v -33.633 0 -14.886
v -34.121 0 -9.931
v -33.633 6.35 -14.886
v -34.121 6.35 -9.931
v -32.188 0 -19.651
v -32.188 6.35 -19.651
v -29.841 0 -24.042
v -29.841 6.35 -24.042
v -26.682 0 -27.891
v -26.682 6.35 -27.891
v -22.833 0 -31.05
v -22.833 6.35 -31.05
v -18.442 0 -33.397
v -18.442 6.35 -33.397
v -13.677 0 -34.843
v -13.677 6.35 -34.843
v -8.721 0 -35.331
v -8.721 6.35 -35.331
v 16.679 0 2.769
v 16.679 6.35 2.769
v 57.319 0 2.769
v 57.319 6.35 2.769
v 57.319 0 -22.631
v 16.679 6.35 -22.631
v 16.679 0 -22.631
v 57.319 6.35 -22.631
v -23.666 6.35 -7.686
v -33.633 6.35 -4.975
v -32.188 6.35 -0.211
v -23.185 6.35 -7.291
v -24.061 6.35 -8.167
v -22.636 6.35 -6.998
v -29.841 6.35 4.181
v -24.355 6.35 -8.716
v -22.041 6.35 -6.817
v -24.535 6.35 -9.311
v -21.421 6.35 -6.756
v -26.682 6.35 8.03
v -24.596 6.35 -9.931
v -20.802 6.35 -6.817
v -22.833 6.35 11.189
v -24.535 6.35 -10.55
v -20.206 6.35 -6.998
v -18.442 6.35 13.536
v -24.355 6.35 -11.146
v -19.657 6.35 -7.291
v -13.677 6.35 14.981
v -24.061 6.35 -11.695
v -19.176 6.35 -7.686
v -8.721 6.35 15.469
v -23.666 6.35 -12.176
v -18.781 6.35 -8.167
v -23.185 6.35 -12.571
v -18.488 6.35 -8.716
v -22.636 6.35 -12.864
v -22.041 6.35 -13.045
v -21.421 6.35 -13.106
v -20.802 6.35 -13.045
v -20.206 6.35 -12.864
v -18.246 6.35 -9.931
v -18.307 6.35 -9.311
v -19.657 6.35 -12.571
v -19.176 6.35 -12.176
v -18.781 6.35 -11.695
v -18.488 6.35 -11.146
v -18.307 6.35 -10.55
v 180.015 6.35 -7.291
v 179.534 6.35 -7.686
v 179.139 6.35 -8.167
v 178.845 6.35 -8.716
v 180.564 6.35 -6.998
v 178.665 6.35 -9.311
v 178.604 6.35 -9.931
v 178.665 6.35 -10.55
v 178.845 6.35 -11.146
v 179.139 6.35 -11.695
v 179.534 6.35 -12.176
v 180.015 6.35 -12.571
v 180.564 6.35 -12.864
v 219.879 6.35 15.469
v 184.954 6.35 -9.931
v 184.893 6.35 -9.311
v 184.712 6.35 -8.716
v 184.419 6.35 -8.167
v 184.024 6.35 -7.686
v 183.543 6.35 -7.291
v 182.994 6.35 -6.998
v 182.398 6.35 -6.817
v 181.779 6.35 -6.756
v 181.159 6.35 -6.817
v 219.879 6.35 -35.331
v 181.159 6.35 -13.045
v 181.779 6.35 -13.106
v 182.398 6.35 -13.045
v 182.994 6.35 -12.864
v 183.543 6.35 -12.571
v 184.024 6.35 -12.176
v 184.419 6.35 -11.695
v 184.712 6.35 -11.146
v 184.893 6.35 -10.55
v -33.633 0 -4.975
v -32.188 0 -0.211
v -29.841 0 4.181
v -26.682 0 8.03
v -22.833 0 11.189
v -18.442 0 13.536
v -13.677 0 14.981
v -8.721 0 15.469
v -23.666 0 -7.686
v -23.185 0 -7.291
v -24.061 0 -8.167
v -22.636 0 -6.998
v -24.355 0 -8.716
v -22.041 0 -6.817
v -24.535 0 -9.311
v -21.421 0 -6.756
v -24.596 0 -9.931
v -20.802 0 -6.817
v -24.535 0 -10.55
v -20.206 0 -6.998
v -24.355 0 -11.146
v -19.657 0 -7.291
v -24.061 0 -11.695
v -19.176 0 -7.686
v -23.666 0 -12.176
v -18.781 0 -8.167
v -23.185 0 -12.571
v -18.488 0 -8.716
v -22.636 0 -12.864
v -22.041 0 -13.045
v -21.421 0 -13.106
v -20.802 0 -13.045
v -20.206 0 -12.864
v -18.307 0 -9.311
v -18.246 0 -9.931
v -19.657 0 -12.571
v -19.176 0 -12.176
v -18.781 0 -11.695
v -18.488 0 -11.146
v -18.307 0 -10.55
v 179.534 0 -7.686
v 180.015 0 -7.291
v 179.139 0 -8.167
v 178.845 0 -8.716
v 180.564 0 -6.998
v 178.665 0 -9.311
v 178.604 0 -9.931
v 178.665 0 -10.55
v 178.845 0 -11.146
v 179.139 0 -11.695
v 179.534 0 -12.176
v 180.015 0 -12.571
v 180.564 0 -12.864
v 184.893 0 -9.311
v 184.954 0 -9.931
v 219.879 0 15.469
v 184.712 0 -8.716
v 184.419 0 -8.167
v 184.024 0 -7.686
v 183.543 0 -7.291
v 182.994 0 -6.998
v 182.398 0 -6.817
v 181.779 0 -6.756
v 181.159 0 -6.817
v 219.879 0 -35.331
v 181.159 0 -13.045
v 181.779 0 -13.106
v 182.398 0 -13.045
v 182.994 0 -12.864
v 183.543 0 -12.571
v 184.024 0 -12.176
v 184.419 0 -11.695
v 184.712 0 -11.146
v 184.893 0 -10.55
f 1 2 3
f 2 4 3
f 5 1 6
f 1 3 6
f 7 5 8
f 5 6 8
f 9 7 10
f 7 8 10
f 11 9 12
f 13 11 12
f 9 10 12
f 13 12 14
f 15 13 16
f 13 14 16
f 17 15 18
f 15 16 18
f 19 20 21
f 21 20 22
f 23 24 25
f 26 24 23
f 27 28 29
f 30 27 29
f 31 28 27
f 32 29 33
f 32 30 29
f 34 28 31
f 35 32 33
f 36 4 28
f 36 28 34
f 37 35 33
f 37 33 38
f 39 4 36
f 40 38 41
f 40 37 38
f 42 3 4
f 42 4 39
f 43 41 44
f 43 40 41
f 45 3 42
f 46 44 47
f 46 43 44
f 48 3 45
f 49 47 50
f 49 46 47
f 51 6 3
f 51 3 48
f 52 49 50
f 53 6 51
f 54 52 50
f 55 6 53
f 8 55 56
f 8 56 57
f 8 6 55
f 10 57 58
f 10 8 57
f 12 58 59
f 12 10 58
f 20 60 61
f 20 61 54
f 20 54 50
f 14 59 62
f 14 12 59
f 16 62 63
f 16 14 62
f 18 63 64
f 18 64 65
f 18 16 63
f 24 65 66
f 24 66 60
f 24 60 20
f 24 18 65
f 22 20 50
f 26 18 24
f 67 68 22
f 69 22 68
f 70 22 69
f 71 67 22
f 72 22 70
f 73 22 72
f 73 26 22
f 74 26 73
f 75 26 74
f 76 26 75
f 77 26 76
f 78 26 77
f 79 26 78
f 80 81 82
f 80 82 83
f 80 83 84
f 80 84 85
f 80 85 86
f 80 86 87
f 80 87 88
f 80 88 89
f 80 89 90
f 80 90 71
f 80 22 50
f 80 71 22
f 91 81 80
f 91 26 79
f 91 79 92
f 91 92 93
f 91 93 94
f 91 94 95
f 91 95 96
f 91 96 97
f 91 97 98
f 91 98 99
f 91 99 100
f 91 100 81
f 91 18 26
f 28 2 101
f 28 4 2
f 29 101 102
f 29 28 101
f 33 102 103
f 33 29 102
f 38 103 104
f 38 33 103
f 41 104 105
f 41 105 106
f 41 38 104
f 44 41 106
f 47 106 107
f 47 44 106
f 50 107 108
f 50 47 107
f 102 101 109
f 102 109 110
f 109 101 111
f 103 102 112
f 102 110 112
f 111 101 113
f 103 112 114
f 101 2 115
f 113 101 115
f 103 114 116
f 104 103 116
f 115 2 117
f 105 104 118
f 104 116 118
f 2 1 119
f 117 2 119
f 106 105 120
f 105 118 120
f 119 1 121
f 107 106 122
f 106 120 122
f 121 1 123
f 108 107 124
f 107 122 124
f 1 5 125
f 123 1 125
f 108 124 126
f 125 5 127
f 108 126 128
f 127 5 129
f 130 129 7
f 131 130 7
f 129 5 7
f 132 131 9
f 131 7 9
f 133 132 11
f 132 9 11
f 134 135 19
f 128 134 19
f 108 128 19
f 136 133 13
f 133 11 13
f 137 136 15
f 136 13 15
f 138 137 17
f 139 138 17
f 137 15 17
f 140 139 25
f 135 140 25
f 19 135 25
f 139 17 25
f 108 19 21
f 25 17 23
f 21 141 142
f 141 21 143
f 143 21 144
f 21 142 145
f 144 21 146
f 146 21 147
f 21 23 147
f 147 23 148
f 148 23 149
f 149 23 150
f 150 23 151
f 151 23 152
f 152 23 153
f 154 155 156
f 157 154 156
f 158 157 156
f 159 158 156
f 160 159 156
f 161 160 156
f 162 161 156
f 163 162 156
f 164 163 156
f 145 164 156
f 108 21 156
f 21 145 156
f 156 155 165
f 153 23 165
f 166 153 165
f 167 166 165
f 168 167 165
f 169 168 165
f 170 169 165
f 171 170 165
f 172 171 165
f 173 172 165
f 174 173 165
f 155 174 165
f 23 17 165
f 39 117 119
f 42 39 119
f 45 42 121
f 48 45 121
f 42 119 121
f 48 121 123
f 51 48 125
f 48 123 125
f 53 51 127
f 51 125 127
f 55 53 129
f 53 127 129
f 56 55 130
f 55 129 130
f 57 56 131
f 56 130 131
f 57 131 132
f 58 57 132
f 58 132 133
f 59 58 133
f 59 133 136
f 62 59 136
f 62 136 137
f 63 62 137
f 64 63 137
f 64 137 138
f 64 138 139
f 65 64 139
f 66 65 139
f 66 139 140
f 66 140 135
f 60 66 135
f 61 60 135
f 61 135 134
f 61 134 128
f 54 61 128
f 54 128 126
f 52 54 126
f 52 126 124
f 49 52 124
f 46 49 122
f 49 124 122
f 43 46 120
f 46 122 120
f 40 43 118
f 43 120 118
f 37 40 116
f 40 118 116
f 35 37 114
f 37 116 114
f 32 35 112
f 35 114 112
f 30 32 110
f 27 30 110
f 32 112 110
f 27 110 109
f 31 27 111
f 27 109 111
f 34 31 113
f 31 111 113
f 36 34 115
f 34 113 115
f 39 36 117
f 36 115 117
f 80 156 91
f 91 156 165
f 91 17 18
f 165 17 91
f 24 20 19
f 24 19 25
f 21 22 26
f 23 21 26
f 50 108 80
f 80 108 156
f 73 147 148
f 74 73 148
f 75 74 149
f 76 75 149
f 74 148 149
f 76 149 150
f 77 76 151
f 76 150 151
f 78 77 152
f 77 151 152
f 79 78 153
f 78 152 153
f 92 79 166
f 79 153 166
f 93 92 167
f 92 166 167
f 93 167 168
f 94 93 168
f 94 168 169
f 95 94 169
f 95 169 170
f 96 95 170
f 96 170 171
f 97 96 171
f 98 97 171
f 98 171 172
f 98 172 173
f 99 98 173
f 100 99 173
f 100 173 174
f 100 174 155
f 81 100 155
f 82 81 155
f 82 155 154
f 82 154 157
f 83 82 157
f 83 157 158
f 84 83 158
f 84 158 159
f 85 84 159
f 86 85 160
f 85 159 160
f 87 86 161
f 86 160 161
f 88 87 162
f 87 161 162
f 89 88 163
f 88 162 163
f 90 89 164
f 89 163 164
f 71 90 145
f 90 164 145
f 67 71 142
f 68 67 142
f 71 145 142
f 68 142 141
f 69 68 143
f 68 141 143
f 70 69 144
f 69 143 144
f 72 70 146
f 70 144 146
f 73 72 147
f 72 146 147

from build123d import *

# Parameters (mm, degrees)
SKETCH1_W                   = 254
SKETCH1_H                   = 50.8
BOSS_EXTRUDE1_DEPTH         = 6.35
F_1_4_0_25_DIAMETER_HOLE1_D = 6.35
FILLET1_R                   = 25.4
SKETCH4_W                   = 40.64
SKETCH4_H                   = 25.4
CUT_EXTRUDE1_DEPTH          = 25.4


with BuildPart() as part:
    # Sketch1 → Boss-Extrude1 (new body)
    with BuildSketch(Plane(origin=(0, 0, 0), x_dir=(1, 0, 0), z_dir=(0, 1, 0))):
        with Locations((92.878696742, 9.930827068)):
            Rectangle(SKETCH1_W, SKETCH1_H)
    extrude(amount=BOSS_EXTRUDE1_DEPTH)

    # 1/4 (0.25) Diameter Hole1 (through all)
    with Locations(Plane(origin=(0, 6.35, 0), x_dir=(1, 0, 0), z_dir=(0, 1, 0))):
        with Locations((-21.421303258, 9.930827068), (181.778696742, 9.930827068)):
            Hole(F_1_4_0_25_DIAMETER_HOLE1_D / 2)

    # Fillet1
    fillet1_edges = [part.edges().sort_by_distance(p)[0] for p in [
        (-34.121303258, 3.175, 15.469172932),
        (-34.121303258, 3.175, -35.330827068),
    ]]
    fillet(fillet1_edges, radius=FILLET1_R - 0.0001)  # a hair under: the kernel refuses the full size

    # Sketch4 → Cut-Extrude1 (cut)
    with BuildSketch(Plane(origin=(0, 6.35, 0), x_dir=(1, 0, 0), z_dir=(0, 1, 0))):
        with Locations((36.998696742, 9.930827068)):
            Rectangle(SKETCH4_W, SKETCH4_H)
    extrude(amount=-CUT_EXTRUDE1_DEPTH, mode=Mode.SUBTRACT)


solid = part.part
